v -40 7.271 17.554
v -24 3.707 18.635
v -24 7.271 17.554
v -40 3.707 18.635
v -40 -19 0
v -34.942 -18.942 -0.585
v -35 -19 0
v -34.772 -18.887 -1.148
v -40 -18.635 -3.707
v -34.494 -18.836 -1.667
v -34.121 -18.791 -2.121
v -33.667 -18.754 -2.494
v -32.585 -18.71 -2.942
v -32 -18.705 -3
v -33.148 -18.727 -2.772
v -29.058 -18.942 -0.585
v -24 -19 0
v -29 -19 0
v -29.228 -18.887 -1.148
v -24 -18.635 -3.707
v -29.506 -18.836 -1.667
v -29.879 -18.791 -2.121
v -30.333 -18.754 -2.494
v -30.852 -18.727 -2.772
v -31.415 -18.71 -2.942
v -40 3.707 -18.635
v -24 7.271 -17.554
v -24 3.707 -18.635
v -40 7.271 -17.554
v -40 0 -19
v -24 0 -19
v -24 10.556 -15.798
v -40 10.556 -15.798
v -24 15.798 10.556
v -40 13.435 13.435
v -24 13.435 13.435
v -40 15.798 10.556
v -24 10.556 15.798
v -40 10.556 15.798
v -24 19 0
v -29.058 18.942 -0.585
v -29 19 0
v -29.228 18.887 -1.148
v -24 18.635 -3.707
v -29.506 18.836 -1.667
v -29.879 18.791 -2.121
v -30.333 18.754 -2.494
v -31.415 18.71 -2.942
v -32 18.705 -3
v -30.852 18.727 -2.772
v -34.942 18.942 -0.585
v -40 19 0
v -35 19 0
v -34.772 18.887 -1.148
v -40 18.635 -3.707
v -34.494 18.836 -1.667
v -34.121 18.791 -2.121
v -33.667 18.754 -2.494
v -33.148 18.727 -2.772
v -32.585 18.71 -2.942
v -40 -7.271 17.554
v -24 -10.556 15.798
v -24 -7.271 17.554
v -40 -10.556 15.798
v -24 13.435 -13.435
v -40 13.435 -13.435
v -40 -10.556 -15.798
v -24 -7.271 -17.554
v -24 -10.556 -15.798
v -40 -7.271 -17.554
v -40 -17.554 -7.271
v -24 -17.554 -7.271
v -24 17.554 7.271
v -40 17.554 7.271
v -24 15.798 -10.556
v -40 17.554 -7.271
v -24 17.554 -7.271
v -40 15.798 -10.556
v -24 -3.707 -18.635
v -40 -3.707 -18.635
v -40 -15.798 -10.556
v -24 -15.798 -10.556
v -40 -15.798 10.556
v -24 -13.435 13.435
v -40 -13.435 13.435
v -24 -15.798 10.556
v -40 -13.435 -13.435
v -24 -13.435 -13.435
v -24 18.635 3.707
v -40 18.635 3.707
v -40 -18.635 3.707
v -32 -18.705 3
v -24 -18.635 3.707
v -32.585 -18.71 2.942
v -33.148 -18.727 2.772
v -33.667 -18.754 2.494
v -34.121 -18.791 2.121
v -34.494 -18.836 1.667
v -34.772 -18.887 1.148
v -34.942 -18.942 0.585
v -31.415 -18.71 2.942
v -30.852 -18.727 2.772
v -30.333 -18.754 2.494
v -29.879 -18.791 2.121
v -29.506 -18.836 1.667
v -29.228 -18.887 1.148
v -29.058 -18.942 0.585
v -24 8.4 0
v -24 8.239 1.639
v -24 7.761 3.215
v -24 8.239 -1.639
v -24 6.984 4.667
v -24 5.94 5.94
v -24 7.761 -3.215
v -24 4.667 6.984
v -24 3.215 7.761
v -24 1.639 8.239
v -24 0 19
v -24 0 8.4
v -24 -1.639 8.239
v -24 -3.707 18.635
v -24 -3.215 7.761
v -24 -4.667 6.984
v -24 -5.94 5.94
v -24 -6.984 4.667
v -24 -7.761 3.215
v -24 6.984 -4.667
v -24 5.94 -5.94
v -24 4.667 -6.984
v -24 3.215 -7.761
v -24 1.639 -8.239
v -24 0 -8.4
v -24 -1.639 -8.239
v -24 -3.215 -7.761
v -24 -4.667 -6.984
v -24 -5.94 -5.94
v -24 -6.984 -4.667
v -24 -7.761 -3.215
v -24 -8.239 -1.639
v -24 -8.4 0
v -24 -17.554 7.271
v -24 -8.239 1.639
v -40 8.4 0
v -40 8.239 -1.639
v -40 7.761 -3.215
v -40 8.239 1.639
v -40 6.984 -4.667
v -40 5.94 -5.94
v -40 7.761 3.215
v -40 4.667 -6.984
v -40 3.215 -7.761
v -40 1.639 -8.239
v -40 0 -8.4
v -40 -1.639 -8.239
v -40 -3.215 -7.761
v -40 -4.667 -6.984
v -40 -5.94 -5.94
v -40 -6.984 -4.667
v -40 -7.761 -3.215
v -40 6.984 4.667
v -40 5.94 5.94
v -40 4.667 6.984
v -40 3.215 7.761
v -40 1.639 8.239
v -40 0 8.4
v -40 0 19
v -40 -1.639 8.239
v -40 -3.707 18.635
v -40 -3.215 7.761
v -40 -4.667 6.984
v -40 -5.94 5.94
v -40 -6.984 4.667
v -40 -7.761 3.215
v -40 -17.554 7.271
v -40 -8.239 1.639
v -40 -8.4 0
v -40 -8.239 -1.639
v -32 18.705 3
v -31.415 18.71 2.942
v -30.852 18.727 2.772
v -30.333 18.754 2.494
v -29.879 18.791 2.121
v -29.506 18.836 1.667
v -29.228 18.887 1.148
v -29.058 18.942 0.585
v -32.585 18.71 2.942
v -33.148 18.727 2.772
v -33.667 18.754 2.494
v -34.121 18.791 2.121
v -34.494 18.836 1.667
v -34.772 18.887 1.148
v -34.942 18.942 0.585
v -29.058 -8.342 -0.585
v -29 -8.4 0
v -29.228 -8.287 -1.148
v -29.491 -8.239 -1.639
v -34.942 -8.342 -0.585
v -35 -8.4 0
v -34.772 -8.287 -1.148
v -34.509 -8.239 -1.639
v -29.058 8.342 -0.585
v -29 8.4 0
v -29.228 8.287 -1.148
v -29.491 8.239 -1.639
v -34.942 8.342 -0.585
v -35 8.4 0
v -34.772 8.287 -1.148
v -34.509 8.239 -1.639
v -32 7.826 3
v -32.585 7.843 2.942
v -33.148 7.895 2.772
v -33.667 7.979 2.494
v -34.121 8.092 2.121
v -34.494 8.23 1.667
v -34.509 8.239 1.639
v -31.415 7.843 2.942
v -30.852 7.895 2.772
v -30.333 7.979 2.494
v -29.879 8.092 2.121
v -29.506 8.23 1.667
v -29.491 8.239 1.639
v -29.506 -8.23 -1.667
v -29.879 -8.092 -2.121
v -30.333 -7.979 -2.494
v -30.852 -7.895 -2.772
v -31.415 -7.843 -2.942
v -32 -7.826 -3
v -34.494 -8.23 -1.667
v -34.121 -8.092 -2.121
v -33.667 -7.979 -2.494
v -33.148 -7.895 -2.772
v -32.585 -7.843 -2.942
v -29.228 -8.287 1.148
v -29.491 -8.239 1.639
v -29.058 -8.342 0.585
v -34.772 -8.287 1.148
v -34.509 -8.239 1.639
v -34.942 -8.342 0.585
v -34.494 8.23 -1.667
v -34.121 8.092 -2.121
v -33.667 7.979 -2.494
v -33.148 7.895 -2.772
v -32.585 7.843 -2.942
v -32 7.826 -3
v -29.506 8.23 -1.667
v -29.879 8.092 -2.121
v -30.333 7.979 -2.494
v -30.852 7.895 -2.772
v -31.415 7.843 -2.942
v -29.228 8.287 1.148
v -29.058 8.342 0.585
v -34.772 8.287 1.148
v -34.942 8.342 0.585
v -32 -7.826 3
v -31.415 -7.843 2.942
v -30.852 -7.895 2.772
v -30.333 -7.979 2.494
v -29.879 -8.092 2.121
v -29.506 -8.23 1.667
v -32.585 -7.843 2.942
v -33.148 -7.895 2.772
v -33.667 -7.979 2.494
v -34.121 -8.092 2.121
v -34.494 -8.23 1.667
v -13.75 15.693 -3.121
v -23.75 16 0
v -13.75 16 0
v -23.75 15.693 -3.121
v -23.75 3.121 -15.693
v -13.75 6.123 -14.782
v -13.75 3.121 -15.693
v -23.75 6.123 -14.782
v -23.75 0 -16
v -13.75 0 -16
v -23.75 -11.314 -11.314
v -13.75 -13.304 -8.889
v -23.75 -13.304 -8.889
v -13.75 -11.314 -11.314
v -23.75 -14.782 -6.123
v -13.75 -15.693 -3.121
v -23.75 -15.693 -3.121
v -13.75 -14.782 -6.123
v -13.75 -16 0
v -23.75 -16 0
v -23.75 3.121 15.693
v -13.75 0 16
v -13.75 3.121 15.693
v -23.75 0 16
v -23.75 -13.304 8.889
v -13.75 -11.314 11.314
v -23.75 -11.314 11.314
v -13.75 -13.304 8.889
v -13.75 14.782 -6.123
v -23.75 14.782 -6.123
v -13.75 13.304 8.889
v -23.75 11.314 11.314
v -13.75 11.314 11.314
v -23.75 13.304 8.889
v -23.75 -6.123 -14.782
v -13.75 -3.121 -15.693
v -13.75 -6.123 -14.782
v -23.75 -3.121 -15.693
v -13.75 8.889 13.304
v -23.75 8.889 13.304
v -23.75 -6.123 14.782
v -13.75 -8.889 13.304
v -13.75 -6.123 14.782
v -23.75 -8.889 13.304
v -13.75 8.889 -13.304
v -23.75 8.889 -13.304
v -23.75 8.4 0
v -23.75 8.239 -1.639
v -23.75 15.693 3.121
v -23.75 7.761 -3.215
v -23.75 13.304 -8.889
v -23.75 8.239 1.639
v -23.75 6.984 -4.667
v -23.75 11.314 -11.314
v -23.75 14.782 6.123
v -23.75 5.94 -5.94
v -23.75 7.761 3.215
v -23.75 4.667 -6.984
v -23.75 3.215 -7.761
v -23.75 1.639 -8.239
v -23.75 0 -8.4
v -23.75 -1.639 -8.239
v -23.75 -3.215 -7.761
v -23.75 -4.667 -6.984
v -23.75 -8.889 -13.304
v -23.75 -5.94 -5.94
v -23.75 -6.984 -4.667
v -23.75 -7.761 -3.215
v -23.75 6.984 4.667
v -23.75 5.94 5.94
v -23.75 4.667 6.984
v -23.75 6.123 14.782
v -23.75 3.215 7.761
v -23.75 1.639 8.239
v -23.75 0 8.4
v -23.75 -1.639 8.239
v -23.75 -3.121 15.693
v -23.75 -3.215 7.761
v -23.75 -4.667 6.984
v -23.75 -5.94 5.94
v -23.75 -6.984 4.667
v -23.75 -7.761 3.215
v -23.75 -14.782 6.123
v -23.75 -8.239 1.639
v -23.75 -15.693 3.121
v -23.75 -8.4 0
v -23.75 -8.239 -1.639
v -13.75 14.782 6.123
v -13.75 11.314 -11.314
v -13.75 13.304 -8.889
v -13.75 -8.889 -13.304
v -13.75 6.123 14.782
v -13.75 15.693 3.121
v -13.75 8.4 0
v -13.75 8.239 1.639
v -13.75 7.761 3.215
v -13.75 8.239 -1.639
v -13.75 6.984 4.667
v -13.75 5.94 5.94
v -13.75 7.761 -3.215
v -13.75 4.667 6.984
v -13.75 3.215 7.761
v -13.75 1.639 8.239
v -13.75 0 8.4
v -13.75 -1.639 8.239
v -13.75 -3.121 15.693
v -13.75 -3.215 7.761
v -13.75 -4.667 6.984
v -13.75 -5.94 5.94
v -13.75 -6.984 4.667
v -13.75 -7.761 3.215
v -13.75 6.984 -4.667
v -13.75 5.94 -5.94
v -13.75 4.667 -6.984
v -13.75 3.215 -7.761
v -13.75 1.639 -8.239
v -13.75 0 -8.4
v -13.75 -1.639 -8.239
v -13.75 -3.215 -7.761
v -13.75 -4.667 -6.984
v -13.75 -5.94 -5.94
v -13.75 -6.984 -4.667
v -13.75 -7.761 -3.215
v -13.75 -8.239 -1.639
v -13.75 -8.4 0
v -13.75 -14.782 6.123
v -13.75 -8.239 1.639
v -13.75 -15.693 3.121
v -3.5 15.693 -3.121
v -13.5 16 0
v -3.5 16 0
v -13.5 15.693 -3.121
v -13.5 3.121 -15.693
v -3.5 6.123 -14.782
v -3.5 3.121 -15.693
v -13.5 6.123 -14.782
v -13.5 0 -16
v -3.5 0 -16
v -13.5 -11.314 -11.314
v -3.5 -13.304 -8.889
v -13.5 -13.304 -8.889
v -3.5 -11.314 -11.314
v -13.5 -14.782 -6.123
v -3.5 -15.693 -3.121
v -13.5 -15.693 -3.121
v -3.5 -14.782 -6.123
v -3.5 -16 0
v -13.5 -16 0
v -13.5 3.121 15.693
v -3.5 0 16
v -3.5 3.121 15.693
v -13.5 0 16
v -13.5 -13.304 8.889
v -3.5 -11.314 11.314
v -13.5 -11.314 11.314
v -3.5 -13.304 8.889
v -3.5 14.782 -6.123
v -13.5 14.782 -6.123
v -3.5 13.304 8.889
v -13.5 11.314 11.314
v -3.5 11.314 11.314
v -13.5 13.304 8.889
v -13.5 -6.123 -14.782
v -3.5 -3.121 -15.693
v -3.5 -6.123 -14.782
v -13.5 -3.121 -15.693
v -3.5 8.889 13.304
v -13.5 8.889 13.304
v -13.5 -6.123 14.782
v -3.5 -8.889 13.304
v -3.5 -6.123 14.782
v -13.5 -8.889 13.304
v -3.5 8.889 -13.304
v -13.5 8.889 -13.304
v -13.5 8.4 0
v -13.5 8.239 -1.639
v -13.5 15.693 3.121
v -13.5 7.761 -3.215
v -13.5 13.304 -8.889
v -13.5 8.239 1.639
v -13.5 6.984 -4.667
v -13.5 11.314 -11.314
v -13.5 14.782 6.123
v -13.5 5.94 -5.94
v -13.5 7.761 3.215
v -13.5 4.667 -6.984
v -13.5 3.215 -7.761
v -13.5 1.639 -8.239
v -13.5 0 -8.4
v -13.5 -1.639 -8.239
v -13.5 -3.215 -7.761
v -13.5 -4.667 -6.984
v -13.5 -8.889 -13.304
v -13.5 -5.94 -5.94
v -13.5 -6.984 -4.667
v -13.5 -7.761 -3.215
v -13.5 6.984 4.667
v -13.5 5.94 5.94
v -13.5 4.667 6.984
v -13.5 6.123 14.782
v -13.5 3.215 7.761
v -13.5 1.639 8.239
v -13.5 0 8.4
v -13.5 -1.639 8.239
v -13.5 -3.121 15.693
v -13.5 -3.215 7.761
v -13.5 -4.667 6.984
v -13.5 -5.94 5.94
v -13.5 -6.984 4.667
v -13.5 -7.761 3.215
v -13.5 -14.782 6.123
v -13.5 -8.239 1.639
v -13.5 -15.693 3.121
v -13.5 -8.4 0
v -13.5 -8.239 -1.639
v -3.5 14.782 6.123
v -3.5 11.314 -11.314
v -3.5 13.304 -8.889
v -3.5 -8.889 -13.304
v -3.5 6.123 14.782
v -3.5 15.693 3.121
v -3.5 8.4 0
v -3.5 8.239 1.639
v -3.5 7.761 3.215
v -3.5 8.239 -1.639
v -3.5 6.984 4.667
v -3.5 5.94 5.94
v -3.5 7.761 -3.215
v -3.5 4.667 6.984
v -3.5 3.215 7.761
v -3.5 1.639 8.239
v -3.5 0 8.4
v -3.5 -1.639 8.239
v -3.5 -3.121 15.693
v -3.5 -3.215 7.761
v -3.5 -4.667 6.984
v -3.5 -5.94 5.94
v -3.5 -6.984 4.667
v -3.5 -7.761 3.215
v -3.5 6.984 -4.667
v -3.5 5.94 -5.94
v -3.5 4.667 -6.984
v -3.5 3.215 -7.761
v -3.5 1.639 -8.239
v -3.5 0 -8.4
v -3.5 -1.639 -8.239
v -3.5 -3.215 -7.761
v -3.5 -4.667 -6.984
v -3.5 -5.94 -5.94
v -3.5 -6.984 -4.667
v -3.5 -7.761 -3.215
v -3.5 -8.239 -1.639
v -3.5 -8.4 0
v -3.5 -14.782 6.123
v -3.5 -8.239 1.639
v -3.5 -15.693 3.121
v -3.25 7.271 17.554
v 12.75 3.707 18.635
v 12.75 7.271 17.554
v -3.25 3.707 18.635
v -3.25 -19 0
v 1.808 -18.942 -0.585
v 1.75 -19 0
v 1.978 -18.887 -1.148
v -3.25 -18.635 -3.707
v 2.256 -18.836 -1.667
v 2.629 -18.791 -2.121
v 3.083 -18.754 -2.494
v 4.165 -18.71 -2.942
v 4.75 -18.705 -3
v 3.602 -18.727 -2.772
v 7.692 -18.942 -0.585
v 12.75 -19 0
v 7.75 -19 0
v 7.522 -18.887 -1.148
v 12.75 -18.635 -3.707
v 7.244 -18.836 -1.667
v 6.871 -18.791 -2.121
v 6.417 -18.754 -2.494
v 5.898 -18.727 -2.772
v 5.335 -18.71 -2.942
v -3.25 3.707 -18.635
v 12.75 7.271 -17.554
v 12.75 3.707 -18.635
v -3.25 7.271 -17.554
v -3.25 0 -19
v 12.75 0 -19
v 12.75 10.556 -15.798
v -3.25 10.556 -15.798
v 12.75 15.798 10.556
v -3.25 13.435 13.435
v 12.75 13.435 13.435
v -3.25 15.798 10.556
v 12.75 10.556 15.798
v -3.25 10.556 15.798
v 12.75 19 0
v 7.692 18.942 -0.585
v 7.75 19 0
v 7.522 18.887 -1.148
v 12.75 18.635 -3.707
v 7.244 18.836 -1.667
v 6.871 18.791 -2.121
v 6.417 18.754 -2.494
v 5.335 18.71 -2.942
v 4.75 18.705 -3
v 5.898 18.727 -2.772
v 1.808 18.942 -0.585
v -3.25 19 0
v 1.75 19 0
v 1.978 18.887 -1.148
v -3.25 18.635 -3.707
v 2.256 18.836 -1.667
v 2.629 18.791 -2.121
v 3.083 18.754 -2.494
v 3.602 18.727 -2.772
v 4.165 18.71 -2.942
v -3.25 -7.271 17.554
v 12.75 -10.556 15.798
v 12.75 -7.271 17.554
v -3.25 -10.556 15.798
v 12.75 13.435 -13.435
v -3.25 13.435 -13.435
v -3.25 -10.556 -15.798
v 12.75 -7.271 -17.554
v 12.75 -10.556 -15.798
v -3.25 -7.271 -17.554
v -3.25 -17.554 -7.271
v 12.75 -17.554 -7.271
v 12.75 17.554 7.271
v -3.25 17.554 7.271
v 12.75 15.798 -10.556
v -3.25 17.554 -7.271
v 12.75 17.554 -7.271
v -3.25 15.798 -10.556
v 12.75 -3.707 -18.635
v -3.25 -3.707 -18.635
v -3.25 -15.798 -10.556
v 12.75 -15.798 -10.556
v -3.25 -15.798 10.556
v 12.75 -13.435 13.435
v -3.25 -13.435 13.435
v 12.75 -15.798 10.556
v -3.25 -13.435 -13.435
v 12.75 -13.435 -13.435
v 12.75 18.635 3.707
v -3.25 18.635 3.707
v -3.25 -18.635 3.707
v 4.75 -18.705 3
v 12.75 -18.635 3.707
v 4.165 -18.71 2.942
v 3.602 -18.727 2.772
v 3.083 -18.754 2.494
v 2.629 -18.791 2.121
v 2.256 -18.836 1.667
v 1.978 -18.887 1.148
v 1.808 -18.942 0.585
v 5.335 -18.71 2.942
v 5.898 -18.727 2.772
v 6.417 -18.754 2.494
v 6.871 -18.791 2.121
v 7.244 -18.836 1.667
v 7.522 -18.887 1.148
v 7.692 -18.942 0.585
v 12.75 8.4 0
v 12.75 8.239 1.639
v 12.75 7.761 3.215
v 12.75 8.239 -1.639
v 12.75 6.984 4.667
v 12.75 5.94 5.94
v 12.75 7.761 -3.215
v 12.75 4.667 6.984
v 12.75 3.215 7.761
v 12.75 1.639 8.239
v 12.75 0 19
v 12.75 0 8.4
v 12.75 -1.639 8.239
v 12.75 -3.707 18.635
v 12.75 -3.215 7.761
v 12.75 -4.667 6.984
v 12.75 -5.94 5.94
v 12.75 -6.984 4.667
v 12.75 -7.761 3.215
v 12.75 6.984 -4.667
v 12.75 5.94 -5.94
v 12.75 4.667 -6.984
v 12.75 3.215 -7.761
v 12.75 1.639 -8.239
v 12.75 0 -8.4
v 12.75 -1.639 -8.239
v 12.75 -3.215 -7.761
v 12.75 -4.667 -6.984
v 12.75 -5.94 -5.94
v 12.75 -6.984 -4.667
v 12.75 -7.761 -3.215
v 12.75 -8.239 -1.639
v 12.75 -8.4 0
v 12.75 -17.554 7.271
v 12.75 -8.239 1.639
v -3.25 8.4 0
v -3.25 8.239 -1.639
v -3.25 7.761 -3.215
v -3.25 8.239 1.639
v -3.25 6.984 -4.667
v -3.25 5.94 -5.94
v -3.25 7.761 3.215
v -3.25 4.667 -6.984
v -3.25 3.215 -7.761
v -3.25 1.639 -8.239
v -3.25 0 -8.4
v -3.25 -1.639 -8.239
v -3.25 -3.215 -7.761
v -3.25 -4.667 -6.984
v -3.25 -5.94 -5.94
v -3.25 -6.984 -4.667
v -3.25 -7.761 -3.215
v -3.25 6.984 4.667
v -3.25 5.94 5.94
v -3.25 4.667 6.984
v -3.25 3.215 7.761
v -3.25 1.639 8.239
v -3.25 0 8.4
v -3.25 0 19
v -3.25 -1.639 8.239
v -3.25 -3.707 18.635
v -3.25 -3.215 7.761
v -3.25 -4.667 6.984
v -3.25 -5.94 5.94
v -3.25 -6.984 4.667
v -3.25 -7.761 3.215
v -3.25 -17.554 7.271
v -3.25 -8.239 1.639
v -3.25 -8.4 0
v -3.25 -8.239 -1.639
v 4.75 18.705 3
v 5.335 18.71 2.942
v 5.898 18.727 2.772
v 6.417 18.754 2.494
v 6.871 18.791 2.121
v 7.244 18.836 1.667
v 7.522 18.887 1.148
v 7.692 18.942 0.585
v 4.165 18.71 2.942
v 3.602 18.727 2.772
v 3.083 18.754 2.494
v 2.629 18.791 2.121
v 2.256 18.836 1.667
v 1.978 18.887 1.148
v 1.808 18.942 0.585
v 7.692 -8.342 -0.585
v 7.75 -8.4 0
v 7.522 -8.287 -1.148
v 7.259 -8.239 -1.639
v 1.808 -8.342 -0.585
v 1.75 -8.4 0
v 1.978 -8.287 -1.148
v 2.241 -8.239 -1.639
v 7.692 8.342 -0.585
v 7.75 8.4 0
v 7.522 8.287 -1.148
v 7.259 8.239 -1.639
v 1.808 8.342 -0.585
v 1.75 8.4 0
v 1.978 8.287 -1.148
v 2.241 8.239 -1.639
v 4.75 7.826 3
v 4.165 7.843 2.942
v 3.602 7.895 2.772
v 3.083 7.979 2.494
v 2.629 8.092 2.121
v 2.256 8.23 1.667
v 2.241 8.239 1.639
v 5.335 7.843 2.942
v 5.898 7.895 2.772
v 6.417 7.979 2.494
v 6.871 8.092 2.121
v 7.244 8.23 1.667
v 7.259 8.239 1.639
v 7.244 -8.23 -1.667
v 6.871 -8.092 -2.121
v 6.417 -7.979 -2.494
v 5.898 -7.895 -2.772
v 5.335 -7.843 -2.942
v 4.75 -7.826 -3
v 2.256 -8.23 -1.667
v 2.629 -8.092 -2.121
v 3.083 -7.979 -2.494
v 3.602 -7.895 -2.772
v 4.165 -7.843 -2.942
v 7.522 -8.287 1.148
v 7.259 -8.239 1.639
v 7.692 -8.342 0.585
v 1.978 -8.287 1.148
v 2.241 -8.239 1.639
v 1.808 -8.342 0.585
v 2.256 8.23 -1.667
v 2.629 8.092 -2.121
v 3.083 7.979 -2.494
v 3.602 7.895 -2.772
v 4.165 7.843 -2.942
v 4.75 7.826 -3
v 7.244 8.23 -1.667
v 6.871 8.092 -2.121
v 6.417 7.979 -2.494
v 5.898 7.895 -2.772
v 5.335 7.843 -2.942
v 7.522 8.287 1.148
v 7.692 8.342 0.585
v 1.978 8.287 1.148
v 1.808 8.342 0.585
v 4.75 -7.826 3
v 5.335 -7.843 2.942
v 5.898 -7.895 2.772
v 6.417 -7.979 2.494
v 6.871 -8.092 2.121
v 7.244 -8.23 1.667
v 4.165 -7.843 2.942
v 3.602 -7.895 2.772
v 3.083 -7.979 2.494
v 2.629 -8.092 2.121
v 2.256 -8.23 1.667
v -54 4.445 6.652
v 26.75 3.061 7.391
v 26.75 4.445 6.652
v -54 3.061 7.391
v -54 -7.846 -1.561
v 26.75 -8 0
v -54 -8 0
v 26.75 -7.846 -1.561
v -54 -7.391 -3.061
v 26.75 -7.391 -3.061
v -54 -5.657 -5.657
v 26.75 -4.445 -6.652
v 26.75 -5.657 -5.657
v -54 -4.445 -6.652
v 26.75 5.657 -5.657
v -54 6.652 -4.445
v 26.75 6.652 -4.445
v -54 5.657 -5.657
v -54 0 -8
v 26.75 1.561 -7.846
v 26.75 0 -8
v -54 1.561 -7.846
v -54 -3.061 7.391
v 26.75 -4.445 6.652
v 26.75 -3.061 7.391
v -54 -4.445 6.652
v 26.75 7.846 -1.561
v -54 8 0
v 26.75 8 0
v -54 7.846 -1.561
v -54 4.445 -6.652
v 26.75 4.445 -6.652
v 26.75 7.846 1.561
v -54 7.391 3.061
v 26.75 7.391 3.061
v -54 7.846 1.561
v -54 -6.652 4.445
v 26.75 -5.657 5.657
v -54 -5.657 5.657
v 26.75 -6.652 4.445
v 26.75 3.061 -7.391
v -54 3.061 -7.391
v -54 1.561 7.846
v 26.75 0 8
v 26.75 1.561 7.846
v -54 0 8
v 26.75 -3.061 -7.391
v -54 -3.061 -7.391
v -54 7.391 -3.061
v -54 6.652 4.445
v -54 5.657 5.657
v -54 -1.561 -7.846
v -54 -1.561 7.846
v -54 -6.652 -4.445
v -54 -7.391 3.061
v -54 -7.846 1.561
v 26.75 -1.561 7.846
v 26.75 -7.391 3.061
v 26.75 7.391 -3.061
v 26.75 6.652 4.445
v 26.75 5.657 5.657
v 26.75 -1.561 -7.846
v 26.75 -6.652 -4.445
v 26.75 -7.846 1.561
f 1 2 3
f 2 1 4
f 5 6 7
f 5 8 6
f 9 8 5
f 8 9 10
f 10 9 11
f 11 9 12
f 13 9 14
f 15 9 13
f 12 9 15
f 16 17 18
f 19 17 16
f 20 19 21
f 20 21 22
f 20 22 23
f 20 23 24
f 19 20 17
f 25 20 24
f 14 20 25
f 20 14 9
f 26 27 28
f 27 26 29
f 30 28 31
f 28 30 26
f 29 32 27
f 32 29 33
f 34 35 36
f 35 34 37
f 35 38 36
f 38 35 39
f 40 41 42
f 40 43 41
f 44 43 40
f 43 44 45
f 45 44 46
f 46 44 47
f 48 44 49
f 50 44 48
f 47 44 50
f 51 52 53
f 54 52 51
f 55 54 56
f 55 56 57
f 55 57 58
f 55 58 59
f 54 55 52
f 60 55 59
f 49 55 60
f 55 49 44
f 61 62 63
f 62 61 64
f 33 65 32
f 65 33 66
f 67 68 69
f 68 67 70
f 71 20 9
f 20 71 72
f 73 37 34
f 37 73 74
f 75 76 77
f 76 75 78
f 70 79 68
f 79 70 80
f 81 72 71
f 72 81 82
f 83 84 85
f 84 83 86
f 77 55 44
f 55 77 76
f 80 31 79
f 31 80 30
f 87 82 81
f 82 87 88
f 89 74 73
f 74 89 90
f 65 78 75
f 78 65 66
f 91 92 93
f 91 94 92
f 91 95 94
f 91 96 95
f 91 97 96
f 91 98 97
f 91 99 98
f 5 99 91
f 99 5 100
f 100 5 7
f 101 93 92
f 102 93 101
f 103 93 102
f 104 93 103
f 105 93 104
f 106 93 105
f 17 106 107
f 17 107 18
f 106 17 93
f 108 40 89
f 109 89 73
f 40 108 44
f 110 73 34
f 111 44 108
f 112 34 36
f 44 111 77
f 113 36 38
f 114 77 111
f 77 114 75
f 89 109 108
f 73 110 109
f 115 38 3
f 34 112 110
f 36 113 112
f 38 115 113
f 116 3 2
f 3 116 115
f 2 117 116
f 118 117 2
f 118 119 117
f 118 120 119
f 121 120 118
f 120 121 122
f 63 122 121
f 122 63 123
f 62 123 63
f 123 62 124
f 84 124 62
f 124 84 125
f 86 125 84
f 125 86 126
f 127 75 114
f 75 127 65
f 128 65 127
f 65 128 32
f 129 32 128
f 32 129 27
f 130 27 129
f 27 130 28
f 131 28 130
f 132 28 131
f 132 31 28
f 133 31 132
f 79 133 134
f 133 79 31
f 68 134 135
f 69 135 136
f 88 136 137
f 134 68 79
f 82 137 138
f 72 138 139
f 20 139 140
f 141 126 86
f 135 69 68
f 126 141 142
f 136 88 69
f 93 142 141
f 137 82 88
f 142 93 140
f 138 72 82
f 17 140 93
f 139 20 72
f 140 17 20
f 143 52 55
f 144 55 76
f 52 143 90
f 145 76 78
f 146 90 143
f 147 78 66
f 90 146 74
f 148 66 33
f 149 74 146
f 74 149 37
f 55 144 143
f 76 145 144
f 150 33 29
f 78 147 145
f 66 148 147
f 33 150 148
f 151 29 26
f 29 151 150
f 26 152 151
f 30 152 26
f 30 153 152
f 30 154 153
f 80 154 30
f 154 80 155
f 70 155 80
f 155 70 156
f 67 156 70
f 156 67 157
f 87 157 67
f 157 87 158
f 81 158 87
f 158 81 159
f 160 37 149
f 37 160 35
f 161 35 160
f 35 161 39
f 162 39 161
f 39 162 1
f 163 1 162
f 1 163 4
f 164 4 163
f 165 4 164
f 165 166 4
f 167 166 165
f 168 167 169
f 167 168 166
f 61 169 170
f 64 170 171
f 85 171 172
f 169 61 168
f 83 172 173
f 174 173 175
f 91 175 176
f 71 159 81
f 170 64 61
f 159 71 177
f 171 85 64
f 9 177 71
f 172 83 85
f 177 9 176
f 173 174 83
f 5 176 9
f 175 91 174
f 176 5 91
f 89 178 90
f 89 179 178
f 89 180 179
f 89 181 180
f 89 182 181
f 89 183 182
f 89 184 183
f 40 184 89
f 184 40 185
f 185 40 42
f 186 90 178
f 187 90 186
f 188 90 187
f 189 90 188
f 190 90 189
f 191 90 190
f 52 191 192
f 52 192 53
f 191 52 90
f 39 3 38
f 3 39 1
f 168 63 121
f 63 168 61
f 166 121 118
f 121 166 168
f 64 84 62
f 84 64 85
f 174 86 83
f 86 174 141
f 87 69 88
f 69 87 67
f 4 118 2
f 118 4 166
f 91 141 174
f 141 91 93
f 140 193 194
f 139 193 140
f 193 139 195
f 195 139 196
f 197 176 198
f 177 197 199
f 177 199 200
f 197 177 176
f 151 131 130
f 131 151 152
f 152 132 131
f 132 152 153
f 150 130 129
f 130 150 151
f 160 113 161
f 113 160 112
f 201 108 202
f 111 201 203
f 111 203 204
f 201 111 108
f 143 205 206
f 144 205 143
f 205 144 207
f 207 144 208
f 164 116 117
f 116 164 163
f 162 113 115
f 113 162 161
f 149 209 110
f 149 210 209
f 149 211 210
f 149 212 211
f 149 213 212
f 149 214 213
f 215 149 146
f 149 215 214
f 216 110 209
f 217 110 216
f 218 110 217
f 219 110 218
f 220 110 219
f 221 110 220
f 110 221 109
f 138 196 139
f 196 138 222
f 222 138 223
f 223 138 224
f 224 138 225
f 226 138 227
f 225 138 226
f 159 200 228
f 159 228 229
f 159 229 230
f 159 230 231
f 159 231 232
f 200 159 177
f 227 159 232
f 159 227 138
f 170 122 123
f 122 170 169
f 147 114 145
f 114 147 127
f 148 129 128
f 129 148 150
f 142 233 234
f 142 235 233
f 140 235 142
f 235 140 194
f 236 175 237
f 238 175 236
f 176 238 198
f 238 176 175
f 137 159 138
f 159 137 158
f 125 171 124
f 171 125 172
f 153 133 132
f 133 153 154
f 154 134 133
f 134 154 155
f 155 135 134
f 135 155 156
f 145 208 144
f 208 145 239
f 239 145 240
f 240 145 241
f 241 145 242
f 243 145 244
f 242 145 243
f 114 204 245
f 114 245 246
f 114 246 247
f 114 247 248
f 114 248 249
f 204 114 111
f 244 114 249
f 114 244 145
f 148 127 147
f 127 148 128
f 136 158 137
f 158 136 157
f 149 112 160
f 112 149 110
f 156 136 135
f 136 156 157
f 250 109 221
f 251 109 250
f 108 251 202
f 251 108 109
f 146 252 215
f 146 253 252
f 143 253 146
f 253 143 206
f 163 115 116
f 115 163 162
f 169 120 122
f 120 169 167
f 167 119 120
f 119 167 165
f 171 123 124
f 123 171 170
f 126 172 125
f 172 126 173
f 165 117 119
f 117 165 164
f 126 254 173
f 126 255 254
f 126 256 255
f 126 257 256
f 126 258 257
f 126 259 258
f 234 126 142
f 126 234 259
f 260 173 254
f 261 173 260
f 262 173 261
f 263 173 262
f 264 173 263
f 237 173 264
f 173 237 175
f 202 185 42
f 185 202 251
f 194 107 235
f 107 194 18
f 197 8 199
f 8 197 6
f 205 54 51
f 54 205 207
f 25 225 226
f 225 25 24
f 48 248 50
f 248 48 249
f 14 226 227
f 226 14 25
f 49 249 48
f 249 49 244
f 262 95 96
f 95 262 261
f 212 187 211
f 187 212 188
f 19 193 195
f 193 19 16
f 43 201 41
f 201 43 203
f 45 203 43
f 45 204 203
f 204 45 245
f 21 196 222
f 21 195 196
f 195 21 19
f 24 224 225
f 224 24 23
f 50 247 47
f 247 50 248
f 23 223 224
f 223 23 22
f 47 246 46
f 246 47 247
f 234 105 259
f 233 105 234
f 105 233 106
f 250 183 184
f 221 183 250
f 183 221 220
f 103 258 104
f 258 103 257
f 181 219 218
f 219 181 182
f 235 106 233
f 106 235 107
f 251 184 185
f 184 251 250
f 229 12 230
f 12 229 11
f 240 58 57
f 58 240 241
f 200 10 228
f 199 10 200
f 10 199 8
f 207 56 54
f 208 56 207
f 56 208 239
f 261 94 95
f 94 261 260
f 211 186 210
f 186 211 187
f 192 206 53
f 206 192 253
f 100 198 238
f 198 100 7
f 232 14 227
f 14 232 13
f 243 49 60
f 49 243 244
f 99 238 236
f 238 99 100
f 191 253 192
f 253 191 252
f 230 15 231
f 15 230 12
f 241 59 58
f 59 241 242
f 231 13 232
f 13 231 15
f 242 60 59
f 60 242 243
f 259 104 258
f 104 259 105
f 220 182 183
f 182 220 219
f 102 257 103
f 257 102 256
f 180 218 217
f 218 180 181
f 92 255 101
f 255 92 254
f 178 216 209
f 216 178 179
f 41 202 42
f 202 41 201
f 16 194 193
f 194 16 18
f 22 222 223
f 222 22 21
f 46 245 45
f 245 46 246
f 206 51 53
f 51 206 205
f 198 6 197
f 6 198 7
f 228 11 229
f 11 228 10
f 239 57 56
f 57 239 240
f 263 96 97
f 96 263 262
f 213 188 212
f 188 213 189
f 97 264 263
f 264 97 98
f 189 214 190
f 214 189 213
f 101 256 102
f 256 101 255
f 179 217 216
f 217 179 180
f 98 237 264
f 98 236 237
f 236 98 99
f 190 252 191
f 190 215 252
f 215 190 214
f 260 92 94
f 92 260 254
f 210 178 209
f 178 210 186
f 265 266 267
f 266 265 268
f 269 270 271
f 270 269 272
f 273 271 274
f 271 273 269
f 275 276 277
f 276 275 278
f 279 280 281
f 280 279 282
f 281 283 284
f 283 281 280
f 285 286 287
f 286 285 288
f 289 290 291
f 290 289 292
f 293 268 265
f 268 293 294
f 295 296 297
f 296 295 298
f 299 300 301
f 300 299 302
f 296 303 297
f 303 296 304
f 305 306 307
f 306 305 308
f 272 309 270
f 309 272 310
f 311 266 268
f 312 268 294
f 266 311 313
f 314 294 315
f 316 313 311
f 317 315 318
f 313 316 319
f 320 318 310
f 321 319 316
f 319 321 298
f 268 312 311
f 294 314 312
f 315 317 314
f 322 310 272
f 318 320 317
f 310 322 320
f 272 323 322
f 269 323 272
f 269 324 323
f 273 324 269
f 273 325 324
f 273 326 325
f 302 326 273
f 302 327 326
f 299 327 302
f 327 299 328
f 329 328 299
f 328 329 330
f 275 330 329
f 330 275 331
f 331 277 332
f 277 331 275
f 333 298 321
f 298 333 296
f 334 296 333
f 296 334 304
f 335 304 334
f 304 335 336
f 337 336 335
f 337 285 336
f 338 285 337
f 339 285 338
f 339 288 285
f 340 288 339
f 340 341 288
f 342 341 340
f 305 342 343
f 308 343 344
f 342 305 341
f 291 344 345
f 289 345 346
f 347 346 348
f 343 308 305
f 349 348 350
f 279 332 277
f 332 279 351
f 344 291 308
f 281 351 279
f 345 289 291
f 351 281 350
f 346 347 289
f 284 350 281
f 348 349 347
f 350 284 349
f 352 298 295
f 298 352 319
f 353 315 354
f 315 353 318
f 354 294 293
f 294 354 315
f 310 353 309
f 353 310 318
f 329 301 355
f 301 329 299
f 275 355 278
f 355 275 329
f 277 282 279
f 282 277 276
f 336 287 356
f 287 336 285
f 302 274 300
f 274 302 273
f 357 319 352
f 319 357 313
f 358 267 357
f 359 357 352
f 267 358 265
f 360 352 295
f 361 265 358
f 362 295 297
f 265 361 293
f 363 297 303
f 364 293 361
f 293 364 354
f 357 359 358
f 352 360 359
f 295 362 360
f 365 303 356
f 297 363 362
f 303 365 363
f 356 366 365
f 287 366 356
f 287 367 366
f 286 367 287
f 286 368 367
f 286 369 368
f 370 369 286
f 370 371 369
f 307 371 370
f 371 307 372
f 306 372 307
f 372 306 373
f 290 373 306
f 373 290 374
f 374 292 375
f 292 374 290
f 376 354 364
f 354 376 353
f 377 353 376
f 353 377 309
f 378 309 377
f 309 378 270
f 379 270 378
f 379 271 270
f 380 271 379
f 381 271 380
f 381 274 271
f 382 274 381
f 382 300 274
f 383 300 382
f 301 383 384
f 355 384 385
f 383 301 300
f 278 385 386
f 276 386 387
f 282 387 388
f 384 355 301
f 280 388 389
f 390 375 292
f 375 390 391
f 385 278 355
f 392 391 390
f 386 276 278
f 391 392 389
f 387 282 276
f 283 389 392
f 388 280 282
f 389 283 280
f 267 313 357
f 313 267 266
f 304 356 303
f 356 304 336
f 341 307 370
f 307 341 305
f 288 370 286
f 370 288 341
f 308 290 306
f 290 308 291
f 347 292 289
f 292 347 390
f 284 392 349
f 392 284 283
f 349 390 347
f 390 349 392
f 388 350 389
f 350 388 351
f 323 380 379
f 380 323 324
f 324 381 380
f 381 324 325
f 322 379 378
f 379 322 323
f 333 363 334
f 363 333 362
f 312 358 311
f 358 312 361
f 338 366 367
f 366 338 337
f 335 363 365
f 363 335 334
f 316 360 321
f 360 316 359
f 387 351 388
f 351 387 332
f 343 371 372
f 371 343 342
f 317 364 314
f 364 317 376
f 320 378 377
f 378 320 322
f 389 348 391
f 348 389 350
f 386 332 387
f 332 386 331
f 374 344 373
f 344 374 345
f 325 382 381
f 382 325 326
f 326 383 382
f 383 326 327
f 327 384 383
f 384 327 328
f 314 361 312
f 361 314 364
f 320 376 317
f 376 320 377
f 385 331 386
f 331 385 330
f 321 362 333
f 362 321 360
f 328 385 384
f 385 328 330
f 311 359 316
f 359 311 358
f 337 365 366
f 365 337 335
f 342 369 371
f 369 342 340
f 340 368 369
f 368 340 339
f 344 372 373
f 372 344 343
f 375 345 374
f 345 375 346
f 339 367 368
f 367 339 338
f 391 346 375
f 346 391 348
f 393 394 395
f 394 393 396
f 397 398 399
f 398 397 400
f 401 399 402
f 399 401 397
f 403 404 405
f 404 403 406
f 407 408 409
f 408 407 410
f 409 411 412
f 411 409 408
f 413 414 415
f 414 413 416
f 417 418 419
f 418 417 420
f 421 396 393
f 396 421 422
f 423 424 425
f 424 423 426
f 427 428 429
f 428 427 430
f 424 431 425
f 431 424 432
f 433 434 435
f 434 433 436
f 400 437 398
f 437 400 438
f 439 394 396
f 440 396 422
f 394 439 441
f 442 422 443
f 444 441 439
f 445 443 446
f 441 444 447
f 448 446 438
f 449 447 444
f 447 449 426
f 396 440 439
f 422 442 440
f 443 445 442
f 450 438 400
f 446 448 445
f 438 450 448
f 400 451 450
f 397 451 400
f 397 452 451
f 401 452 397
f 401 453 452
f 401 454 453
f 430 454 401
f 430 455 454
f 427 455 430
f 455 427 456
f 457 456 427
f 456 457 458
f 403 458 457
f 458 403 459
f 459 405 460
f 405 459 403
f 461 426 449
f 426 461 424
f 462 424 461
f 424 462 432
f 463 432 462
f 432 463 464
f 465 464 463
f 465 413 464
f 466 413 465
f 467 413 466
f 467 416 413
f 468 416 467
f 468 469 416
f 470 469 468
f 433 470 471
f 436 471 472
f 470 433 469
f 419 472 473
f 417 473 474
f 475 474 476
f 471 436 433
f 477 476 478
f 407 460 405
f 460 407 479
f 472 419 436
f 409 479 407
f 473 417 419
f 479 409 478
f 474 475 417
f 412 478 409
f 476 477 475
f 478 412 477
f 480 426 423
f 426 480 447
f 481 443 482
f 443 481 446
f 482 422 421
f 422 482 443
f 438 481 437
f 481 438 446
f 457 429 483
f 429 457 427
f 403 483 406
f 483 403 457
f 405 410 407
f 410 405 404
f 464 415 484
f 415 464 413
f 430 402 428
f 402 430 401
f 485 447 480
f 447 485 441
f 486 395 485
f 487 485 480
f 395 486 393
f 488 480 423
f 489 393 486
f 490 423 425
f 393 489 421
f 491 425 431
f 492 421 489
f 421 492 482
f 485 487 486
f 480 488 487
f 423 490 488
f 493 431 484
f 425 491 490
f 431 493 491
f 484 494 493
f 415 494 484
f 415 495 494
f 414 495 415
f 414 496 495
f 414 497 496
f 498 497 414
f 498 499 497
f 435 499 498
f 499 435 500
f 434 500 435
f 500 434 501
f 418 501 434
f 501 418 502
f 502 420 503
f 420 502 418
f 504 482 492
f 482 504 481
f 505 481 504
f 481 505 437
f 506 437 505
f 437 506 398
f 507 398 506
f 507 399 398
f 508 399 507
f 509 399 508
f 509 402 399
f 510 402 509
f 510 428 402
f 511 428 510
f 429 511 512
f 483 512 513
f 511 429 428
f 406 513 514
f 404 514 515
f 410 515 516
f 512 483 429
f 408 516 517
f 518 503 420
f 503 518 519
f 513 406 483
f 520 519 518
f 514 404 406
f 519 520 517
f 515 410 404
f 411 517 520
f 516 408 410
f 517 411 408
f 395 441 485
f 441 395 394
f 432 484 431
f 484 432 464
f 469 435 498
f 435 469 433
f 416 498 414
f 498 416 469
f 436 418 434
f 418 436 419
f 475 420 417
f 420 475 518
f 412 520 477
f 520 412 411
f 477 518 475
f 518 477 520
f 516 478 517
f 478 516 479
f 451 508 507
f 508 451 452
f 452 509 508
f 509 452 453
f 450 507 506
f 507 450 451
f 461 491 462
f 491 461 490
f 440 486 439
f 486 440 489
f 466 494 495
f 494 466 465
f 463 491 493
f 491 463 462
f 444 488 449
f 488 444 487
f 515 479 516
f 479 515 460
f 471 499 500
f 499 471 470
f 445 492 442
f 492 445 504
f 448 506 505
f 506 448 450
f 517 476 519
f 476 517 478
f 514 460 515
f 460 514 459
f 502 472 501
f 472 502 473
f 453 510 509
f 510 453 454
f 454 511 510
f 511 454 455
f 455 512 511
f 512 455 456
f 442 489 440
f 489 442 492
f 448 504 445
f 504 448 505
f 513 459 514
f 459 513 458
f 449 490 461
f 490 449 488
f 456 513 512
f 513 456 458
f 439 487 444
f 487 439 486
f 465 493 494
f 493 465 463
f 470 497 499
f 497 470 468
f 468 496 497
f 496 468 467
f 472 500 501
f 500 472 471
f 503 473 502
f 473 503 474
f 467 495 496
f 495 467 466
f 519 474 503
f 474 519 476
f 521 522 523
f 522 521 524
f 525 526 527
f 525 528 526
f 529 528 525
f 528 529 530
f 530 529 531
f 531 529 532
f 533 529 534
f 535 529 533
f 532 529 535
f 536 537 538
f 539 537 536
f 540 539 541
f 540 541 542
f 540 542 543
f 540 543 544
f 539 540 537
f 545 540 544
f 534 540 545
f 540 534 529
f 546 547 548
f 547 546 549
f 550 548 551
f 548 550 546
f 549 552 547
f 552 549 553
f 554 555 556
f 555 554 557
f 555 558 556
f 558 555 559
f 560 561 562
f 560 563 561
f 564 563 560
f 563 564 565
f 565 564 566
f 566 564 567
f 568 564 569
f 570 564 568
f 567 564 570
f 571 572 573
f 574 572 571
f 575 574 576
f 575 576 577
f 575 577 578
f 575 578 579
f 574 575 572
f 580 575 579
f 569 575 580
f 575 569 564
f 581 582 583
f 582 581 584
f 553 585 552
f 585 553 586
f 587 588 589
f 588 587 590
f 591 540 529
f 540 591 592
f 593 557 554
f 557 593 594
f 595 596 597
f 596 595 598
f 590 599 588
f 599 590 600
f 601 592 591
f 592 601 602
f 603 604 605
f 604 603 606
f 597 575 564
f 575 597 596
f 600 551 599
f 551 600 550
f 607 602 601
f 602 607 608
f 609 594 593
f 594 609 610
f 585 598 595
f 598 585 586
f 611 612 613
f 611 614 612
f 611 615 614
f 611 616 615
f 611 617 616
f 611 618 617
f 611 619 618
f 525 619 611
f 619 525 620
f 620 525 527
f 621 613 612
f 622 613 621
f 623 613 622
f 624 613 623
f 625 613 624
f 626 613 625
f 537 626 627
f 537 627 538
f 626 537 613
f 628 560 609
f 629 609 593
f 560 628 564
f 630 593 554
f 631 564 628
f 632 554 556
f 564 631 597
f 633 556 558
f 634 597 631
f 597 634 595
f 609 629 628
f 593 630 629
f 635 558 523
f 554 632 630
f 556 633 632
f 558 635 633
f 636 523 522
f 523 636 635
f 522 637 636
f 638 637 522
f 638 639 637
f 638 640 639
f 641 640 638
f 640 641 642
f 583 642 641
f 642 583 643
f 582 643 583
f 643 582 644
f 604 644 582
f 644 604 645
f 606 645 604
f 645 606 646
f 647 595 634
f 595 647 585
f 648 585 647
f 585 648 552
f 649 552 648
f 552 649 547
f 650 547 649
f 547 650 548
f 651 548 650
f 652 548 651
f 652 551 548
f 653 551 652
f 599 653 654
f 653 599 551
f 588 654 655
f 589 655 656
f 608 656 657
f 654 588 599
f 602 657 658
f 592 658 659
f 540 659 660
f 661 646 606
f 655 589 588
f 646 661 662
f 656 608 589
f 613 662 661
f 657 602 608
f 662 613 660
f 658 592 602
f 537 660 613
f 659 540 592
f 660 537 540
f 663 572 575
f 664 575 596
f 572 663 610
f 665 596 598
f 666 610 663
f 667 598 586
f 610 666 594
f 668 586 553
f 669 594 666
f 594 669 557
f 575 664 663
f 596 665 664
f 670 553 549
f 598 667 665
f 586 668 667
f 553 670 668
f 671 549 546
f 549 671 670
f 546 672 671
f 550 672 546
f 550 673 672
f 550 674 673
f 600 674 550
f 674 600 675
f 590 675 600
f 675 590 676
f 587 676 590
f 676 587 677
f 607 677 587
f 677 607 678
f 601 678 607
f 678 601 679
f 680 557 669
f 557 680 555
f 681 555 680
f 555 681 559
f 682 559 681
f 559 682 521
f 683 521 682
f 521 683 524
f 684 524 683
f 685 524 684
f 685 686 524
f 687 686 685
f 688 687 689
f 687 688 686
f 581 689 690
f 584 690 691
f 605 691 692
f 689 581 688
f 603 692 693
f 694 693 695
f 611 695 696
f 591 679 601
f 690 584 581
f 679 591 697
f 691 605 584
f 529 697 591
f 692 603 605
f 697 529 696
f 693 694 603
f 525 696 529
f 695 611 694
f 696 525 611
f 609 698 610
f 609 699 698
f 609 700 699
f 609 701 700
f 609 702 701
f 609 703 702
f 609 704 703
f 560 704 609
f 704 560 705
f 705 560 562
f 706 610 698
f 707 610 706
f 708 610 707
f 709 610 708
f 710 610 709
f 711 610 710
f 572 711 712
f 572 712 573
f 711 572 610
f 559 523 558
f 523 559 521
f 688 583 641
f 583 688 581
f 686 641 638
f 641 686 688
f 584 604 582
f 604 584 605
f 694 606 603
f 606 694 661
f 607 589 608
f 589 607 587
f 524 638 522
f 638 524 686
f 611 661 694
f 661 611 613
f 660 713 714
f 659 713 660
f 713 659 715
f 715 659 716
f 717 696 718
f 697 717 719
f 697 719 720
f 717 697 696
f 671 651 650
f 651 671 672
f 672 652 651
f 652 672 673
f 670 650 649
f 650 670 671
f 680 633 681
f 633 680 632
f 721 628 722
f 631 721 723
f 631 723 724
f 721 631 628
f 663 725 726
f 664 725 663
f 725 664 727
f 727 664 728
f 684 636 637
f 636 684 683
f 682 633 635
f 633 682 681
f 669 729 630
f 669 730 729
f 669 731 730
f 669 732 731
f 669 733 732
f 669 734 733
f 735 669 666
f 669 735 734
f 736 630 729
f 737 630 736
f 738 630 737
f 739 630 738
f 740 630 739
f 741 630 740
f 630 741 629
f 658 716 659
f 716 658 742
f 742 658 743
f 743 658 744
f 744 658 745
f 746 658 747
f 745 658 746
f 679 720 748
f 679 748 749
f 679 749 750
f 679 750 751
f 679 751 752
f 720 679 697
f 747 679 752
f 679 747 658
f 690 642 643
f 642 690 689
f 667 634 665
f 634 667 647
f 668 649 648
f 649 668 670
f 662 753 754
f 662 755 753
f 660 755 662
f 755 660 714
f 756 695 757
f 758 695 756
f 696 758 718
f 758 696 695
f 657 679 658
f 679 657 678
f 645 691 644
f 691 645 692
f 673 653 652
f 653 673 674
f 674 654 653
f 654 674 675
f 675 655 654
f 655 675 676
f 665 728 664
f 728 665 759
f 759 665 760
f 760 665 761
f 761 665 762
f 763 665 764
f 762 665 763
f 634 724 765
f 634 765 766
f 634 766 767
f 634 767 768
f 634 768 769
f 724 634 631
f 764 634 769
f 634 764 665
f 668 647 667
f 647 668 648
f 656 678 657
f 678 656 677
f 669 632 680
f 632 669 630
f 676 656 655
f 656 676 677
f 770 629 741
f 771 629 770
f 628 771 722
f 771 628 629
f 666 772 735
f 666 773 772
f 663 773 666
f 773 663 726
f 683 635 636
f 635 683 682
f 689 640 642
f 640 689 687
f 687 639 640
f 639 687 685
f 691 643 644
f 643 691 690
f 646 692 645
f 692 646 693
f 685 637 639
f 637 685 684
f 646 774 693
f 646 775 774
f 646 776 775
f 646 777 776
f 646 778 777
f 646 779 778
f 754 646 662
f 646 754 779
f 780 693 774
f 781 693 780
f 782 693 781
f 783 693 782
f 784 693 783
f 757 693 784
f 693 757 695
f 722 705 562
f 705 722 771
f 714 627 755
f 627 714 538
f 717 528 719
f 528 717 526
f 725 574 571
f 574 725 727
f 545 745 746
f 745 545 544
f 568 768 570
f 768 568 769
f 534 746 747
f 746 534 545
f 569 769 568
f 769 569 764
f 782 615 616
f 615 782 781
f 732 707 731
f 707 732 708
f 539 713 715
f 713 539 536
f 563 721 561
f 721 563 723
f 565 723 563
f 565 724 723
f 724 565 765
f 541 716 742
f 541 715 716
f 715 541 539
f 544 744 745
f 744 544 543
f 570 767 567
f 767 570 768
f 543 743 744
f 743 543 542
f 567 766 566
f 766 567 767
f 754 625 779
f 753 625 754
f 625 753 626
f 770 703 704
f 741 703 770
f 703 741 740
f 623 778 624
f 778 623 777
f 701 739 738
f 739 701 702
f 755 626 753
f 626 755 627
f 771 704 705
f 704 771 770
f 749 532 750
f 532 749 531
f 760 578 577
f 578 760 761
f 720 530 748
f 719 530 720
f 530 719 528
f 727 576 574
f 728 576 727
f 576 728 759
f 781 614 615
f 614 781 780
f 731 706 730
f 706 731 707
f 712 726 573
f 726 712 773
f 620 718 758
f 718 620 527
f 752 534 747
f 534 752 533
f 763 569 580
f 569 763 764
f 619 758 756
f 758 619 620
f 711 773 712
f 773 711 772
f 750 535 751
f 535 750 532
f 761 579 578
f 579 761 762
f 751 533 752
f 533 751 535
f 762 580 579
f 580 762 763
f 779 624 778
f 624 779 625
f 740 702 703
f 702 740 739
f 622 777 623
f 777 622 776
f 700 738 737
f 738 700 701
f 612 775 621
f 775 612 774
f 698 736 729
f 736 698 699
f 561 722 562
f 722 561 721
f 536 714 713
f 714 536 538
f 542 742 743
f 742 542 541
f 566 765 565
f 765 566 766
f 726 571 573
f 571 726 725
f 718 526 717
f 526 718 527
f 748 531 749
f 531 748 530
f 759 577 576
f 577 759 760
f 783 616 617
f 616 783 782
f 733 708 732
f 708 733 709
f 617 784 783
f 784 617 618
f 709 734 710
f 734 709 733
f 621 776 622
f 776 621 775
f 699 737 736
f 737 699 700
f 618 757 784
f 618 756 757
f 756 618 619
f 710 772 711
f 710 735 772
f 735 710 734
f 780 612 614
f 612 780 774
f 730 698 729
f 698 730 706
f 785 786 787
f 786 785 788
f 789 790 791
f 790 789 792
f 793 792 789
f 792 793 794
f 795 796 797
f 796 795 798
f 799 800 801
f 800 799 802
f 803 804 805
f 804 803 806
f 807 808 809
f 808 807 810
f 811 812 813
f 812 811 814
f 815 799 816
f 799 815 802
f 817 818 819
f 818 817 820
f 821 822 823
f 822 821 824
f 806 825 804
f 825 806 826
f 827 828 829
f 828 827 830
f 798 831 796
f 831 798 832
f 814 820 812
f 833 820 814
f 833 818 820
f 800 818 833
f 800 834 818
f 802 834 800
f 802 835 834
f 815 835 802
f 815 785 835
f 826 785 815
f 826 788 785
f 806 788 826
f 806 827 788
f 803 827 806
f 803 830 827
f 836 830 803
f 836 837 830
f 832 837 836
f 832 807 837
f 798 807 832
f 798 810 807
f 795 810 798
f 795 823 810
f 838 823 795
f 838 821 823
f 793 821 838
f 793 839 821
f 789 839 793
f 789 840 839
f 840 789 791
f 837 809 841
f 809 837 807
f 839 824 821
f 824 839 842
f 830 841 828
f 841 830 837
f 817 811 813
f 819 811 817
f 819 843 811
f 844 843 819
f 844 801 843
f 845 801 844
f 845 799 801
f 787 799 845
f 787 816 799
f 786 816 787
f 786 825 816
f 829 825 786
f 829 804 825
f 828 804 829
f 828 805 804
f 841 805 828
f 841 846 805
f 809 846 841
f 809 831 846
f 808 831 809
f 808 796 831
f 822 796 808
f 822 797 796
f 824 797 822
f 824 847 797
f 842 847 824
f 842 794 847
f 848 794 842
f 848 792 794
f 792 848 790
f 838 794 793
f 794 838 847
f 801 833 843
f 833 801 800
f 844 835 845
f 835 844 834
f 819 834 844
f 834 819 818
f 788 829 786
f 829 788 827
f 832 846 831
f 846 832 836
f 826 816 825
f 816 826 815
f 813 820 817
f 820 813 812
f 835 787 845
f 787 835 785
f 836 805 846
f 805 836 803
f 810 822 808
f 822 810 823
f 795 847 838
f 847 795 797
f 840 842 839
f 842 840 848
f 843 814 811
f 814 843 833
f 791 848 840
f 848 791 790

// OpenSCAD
$fn = 32;

// ------------------------------------------------------------------------
// Shaft with rings and collars: d16 shaft, 4 rings
// Every part is its own module, assembly() places them once.
// ------------------------------------------------------------------------

// --- part 1 ---
module shaft() {
  translate([0, 0, -40.375]) cylinder(h = 80.75, d = 16);
}

// --- part 2 ---
module collar_a() {
  difference() {
    cylinder(h = 16, d = 38);
    translate([0, 0, -1]) cylinder(h = 18, d = 16.8);
    translate([0, 0, 8]) rotate([90, 0, 0]) cylinder(h = 40, d = 6, center = true);
  }
}

// --- part 3 ---
module spacer_a() {
  difference() {
      translate([0, 0, 0]) cylinder(h = 10, d = 32);
      translate([0, 0, -1]) cylinder(h = 12, d = 16.8);
    }
}

// --- part 4 ---
module spacer_b() {
  difference() {
      translate([0, 0, 0]) cylinder(h = 10, d = 32);
      translate([0, 0, -1]) cylinder(h = 12, d = 16.8);
    }
}

// --- part 5 ---
module collar_b() {
  difference() {
    cylinder(h = 16, d = 38);
    translate([0, 0, -1]) cylinder(h = 18, d = 16.8);
    translate([0, 0, 8]) rotate([90, 0, 0]) cylinder(h = 40, d = 6, center = true);
  }
}

// --- assembly ---
module assembly() {
  translate([-13.625, 0, 0]) rotate([0, 90, 0]) shaft();
  translate([-40, 0, 0]) rotate([0, 90, 0]) collar_a();
  translate([-23.75, 0, 0]) rotate([0, 90, 0]) spacer_a();
  translate([-13.5, 0, 0]) rotate([0, 90, 0]) spacer_b();
  translate([-3.25, 0, 0]) rotate([0, 90, 0]) collar_b();
}

assembly();
